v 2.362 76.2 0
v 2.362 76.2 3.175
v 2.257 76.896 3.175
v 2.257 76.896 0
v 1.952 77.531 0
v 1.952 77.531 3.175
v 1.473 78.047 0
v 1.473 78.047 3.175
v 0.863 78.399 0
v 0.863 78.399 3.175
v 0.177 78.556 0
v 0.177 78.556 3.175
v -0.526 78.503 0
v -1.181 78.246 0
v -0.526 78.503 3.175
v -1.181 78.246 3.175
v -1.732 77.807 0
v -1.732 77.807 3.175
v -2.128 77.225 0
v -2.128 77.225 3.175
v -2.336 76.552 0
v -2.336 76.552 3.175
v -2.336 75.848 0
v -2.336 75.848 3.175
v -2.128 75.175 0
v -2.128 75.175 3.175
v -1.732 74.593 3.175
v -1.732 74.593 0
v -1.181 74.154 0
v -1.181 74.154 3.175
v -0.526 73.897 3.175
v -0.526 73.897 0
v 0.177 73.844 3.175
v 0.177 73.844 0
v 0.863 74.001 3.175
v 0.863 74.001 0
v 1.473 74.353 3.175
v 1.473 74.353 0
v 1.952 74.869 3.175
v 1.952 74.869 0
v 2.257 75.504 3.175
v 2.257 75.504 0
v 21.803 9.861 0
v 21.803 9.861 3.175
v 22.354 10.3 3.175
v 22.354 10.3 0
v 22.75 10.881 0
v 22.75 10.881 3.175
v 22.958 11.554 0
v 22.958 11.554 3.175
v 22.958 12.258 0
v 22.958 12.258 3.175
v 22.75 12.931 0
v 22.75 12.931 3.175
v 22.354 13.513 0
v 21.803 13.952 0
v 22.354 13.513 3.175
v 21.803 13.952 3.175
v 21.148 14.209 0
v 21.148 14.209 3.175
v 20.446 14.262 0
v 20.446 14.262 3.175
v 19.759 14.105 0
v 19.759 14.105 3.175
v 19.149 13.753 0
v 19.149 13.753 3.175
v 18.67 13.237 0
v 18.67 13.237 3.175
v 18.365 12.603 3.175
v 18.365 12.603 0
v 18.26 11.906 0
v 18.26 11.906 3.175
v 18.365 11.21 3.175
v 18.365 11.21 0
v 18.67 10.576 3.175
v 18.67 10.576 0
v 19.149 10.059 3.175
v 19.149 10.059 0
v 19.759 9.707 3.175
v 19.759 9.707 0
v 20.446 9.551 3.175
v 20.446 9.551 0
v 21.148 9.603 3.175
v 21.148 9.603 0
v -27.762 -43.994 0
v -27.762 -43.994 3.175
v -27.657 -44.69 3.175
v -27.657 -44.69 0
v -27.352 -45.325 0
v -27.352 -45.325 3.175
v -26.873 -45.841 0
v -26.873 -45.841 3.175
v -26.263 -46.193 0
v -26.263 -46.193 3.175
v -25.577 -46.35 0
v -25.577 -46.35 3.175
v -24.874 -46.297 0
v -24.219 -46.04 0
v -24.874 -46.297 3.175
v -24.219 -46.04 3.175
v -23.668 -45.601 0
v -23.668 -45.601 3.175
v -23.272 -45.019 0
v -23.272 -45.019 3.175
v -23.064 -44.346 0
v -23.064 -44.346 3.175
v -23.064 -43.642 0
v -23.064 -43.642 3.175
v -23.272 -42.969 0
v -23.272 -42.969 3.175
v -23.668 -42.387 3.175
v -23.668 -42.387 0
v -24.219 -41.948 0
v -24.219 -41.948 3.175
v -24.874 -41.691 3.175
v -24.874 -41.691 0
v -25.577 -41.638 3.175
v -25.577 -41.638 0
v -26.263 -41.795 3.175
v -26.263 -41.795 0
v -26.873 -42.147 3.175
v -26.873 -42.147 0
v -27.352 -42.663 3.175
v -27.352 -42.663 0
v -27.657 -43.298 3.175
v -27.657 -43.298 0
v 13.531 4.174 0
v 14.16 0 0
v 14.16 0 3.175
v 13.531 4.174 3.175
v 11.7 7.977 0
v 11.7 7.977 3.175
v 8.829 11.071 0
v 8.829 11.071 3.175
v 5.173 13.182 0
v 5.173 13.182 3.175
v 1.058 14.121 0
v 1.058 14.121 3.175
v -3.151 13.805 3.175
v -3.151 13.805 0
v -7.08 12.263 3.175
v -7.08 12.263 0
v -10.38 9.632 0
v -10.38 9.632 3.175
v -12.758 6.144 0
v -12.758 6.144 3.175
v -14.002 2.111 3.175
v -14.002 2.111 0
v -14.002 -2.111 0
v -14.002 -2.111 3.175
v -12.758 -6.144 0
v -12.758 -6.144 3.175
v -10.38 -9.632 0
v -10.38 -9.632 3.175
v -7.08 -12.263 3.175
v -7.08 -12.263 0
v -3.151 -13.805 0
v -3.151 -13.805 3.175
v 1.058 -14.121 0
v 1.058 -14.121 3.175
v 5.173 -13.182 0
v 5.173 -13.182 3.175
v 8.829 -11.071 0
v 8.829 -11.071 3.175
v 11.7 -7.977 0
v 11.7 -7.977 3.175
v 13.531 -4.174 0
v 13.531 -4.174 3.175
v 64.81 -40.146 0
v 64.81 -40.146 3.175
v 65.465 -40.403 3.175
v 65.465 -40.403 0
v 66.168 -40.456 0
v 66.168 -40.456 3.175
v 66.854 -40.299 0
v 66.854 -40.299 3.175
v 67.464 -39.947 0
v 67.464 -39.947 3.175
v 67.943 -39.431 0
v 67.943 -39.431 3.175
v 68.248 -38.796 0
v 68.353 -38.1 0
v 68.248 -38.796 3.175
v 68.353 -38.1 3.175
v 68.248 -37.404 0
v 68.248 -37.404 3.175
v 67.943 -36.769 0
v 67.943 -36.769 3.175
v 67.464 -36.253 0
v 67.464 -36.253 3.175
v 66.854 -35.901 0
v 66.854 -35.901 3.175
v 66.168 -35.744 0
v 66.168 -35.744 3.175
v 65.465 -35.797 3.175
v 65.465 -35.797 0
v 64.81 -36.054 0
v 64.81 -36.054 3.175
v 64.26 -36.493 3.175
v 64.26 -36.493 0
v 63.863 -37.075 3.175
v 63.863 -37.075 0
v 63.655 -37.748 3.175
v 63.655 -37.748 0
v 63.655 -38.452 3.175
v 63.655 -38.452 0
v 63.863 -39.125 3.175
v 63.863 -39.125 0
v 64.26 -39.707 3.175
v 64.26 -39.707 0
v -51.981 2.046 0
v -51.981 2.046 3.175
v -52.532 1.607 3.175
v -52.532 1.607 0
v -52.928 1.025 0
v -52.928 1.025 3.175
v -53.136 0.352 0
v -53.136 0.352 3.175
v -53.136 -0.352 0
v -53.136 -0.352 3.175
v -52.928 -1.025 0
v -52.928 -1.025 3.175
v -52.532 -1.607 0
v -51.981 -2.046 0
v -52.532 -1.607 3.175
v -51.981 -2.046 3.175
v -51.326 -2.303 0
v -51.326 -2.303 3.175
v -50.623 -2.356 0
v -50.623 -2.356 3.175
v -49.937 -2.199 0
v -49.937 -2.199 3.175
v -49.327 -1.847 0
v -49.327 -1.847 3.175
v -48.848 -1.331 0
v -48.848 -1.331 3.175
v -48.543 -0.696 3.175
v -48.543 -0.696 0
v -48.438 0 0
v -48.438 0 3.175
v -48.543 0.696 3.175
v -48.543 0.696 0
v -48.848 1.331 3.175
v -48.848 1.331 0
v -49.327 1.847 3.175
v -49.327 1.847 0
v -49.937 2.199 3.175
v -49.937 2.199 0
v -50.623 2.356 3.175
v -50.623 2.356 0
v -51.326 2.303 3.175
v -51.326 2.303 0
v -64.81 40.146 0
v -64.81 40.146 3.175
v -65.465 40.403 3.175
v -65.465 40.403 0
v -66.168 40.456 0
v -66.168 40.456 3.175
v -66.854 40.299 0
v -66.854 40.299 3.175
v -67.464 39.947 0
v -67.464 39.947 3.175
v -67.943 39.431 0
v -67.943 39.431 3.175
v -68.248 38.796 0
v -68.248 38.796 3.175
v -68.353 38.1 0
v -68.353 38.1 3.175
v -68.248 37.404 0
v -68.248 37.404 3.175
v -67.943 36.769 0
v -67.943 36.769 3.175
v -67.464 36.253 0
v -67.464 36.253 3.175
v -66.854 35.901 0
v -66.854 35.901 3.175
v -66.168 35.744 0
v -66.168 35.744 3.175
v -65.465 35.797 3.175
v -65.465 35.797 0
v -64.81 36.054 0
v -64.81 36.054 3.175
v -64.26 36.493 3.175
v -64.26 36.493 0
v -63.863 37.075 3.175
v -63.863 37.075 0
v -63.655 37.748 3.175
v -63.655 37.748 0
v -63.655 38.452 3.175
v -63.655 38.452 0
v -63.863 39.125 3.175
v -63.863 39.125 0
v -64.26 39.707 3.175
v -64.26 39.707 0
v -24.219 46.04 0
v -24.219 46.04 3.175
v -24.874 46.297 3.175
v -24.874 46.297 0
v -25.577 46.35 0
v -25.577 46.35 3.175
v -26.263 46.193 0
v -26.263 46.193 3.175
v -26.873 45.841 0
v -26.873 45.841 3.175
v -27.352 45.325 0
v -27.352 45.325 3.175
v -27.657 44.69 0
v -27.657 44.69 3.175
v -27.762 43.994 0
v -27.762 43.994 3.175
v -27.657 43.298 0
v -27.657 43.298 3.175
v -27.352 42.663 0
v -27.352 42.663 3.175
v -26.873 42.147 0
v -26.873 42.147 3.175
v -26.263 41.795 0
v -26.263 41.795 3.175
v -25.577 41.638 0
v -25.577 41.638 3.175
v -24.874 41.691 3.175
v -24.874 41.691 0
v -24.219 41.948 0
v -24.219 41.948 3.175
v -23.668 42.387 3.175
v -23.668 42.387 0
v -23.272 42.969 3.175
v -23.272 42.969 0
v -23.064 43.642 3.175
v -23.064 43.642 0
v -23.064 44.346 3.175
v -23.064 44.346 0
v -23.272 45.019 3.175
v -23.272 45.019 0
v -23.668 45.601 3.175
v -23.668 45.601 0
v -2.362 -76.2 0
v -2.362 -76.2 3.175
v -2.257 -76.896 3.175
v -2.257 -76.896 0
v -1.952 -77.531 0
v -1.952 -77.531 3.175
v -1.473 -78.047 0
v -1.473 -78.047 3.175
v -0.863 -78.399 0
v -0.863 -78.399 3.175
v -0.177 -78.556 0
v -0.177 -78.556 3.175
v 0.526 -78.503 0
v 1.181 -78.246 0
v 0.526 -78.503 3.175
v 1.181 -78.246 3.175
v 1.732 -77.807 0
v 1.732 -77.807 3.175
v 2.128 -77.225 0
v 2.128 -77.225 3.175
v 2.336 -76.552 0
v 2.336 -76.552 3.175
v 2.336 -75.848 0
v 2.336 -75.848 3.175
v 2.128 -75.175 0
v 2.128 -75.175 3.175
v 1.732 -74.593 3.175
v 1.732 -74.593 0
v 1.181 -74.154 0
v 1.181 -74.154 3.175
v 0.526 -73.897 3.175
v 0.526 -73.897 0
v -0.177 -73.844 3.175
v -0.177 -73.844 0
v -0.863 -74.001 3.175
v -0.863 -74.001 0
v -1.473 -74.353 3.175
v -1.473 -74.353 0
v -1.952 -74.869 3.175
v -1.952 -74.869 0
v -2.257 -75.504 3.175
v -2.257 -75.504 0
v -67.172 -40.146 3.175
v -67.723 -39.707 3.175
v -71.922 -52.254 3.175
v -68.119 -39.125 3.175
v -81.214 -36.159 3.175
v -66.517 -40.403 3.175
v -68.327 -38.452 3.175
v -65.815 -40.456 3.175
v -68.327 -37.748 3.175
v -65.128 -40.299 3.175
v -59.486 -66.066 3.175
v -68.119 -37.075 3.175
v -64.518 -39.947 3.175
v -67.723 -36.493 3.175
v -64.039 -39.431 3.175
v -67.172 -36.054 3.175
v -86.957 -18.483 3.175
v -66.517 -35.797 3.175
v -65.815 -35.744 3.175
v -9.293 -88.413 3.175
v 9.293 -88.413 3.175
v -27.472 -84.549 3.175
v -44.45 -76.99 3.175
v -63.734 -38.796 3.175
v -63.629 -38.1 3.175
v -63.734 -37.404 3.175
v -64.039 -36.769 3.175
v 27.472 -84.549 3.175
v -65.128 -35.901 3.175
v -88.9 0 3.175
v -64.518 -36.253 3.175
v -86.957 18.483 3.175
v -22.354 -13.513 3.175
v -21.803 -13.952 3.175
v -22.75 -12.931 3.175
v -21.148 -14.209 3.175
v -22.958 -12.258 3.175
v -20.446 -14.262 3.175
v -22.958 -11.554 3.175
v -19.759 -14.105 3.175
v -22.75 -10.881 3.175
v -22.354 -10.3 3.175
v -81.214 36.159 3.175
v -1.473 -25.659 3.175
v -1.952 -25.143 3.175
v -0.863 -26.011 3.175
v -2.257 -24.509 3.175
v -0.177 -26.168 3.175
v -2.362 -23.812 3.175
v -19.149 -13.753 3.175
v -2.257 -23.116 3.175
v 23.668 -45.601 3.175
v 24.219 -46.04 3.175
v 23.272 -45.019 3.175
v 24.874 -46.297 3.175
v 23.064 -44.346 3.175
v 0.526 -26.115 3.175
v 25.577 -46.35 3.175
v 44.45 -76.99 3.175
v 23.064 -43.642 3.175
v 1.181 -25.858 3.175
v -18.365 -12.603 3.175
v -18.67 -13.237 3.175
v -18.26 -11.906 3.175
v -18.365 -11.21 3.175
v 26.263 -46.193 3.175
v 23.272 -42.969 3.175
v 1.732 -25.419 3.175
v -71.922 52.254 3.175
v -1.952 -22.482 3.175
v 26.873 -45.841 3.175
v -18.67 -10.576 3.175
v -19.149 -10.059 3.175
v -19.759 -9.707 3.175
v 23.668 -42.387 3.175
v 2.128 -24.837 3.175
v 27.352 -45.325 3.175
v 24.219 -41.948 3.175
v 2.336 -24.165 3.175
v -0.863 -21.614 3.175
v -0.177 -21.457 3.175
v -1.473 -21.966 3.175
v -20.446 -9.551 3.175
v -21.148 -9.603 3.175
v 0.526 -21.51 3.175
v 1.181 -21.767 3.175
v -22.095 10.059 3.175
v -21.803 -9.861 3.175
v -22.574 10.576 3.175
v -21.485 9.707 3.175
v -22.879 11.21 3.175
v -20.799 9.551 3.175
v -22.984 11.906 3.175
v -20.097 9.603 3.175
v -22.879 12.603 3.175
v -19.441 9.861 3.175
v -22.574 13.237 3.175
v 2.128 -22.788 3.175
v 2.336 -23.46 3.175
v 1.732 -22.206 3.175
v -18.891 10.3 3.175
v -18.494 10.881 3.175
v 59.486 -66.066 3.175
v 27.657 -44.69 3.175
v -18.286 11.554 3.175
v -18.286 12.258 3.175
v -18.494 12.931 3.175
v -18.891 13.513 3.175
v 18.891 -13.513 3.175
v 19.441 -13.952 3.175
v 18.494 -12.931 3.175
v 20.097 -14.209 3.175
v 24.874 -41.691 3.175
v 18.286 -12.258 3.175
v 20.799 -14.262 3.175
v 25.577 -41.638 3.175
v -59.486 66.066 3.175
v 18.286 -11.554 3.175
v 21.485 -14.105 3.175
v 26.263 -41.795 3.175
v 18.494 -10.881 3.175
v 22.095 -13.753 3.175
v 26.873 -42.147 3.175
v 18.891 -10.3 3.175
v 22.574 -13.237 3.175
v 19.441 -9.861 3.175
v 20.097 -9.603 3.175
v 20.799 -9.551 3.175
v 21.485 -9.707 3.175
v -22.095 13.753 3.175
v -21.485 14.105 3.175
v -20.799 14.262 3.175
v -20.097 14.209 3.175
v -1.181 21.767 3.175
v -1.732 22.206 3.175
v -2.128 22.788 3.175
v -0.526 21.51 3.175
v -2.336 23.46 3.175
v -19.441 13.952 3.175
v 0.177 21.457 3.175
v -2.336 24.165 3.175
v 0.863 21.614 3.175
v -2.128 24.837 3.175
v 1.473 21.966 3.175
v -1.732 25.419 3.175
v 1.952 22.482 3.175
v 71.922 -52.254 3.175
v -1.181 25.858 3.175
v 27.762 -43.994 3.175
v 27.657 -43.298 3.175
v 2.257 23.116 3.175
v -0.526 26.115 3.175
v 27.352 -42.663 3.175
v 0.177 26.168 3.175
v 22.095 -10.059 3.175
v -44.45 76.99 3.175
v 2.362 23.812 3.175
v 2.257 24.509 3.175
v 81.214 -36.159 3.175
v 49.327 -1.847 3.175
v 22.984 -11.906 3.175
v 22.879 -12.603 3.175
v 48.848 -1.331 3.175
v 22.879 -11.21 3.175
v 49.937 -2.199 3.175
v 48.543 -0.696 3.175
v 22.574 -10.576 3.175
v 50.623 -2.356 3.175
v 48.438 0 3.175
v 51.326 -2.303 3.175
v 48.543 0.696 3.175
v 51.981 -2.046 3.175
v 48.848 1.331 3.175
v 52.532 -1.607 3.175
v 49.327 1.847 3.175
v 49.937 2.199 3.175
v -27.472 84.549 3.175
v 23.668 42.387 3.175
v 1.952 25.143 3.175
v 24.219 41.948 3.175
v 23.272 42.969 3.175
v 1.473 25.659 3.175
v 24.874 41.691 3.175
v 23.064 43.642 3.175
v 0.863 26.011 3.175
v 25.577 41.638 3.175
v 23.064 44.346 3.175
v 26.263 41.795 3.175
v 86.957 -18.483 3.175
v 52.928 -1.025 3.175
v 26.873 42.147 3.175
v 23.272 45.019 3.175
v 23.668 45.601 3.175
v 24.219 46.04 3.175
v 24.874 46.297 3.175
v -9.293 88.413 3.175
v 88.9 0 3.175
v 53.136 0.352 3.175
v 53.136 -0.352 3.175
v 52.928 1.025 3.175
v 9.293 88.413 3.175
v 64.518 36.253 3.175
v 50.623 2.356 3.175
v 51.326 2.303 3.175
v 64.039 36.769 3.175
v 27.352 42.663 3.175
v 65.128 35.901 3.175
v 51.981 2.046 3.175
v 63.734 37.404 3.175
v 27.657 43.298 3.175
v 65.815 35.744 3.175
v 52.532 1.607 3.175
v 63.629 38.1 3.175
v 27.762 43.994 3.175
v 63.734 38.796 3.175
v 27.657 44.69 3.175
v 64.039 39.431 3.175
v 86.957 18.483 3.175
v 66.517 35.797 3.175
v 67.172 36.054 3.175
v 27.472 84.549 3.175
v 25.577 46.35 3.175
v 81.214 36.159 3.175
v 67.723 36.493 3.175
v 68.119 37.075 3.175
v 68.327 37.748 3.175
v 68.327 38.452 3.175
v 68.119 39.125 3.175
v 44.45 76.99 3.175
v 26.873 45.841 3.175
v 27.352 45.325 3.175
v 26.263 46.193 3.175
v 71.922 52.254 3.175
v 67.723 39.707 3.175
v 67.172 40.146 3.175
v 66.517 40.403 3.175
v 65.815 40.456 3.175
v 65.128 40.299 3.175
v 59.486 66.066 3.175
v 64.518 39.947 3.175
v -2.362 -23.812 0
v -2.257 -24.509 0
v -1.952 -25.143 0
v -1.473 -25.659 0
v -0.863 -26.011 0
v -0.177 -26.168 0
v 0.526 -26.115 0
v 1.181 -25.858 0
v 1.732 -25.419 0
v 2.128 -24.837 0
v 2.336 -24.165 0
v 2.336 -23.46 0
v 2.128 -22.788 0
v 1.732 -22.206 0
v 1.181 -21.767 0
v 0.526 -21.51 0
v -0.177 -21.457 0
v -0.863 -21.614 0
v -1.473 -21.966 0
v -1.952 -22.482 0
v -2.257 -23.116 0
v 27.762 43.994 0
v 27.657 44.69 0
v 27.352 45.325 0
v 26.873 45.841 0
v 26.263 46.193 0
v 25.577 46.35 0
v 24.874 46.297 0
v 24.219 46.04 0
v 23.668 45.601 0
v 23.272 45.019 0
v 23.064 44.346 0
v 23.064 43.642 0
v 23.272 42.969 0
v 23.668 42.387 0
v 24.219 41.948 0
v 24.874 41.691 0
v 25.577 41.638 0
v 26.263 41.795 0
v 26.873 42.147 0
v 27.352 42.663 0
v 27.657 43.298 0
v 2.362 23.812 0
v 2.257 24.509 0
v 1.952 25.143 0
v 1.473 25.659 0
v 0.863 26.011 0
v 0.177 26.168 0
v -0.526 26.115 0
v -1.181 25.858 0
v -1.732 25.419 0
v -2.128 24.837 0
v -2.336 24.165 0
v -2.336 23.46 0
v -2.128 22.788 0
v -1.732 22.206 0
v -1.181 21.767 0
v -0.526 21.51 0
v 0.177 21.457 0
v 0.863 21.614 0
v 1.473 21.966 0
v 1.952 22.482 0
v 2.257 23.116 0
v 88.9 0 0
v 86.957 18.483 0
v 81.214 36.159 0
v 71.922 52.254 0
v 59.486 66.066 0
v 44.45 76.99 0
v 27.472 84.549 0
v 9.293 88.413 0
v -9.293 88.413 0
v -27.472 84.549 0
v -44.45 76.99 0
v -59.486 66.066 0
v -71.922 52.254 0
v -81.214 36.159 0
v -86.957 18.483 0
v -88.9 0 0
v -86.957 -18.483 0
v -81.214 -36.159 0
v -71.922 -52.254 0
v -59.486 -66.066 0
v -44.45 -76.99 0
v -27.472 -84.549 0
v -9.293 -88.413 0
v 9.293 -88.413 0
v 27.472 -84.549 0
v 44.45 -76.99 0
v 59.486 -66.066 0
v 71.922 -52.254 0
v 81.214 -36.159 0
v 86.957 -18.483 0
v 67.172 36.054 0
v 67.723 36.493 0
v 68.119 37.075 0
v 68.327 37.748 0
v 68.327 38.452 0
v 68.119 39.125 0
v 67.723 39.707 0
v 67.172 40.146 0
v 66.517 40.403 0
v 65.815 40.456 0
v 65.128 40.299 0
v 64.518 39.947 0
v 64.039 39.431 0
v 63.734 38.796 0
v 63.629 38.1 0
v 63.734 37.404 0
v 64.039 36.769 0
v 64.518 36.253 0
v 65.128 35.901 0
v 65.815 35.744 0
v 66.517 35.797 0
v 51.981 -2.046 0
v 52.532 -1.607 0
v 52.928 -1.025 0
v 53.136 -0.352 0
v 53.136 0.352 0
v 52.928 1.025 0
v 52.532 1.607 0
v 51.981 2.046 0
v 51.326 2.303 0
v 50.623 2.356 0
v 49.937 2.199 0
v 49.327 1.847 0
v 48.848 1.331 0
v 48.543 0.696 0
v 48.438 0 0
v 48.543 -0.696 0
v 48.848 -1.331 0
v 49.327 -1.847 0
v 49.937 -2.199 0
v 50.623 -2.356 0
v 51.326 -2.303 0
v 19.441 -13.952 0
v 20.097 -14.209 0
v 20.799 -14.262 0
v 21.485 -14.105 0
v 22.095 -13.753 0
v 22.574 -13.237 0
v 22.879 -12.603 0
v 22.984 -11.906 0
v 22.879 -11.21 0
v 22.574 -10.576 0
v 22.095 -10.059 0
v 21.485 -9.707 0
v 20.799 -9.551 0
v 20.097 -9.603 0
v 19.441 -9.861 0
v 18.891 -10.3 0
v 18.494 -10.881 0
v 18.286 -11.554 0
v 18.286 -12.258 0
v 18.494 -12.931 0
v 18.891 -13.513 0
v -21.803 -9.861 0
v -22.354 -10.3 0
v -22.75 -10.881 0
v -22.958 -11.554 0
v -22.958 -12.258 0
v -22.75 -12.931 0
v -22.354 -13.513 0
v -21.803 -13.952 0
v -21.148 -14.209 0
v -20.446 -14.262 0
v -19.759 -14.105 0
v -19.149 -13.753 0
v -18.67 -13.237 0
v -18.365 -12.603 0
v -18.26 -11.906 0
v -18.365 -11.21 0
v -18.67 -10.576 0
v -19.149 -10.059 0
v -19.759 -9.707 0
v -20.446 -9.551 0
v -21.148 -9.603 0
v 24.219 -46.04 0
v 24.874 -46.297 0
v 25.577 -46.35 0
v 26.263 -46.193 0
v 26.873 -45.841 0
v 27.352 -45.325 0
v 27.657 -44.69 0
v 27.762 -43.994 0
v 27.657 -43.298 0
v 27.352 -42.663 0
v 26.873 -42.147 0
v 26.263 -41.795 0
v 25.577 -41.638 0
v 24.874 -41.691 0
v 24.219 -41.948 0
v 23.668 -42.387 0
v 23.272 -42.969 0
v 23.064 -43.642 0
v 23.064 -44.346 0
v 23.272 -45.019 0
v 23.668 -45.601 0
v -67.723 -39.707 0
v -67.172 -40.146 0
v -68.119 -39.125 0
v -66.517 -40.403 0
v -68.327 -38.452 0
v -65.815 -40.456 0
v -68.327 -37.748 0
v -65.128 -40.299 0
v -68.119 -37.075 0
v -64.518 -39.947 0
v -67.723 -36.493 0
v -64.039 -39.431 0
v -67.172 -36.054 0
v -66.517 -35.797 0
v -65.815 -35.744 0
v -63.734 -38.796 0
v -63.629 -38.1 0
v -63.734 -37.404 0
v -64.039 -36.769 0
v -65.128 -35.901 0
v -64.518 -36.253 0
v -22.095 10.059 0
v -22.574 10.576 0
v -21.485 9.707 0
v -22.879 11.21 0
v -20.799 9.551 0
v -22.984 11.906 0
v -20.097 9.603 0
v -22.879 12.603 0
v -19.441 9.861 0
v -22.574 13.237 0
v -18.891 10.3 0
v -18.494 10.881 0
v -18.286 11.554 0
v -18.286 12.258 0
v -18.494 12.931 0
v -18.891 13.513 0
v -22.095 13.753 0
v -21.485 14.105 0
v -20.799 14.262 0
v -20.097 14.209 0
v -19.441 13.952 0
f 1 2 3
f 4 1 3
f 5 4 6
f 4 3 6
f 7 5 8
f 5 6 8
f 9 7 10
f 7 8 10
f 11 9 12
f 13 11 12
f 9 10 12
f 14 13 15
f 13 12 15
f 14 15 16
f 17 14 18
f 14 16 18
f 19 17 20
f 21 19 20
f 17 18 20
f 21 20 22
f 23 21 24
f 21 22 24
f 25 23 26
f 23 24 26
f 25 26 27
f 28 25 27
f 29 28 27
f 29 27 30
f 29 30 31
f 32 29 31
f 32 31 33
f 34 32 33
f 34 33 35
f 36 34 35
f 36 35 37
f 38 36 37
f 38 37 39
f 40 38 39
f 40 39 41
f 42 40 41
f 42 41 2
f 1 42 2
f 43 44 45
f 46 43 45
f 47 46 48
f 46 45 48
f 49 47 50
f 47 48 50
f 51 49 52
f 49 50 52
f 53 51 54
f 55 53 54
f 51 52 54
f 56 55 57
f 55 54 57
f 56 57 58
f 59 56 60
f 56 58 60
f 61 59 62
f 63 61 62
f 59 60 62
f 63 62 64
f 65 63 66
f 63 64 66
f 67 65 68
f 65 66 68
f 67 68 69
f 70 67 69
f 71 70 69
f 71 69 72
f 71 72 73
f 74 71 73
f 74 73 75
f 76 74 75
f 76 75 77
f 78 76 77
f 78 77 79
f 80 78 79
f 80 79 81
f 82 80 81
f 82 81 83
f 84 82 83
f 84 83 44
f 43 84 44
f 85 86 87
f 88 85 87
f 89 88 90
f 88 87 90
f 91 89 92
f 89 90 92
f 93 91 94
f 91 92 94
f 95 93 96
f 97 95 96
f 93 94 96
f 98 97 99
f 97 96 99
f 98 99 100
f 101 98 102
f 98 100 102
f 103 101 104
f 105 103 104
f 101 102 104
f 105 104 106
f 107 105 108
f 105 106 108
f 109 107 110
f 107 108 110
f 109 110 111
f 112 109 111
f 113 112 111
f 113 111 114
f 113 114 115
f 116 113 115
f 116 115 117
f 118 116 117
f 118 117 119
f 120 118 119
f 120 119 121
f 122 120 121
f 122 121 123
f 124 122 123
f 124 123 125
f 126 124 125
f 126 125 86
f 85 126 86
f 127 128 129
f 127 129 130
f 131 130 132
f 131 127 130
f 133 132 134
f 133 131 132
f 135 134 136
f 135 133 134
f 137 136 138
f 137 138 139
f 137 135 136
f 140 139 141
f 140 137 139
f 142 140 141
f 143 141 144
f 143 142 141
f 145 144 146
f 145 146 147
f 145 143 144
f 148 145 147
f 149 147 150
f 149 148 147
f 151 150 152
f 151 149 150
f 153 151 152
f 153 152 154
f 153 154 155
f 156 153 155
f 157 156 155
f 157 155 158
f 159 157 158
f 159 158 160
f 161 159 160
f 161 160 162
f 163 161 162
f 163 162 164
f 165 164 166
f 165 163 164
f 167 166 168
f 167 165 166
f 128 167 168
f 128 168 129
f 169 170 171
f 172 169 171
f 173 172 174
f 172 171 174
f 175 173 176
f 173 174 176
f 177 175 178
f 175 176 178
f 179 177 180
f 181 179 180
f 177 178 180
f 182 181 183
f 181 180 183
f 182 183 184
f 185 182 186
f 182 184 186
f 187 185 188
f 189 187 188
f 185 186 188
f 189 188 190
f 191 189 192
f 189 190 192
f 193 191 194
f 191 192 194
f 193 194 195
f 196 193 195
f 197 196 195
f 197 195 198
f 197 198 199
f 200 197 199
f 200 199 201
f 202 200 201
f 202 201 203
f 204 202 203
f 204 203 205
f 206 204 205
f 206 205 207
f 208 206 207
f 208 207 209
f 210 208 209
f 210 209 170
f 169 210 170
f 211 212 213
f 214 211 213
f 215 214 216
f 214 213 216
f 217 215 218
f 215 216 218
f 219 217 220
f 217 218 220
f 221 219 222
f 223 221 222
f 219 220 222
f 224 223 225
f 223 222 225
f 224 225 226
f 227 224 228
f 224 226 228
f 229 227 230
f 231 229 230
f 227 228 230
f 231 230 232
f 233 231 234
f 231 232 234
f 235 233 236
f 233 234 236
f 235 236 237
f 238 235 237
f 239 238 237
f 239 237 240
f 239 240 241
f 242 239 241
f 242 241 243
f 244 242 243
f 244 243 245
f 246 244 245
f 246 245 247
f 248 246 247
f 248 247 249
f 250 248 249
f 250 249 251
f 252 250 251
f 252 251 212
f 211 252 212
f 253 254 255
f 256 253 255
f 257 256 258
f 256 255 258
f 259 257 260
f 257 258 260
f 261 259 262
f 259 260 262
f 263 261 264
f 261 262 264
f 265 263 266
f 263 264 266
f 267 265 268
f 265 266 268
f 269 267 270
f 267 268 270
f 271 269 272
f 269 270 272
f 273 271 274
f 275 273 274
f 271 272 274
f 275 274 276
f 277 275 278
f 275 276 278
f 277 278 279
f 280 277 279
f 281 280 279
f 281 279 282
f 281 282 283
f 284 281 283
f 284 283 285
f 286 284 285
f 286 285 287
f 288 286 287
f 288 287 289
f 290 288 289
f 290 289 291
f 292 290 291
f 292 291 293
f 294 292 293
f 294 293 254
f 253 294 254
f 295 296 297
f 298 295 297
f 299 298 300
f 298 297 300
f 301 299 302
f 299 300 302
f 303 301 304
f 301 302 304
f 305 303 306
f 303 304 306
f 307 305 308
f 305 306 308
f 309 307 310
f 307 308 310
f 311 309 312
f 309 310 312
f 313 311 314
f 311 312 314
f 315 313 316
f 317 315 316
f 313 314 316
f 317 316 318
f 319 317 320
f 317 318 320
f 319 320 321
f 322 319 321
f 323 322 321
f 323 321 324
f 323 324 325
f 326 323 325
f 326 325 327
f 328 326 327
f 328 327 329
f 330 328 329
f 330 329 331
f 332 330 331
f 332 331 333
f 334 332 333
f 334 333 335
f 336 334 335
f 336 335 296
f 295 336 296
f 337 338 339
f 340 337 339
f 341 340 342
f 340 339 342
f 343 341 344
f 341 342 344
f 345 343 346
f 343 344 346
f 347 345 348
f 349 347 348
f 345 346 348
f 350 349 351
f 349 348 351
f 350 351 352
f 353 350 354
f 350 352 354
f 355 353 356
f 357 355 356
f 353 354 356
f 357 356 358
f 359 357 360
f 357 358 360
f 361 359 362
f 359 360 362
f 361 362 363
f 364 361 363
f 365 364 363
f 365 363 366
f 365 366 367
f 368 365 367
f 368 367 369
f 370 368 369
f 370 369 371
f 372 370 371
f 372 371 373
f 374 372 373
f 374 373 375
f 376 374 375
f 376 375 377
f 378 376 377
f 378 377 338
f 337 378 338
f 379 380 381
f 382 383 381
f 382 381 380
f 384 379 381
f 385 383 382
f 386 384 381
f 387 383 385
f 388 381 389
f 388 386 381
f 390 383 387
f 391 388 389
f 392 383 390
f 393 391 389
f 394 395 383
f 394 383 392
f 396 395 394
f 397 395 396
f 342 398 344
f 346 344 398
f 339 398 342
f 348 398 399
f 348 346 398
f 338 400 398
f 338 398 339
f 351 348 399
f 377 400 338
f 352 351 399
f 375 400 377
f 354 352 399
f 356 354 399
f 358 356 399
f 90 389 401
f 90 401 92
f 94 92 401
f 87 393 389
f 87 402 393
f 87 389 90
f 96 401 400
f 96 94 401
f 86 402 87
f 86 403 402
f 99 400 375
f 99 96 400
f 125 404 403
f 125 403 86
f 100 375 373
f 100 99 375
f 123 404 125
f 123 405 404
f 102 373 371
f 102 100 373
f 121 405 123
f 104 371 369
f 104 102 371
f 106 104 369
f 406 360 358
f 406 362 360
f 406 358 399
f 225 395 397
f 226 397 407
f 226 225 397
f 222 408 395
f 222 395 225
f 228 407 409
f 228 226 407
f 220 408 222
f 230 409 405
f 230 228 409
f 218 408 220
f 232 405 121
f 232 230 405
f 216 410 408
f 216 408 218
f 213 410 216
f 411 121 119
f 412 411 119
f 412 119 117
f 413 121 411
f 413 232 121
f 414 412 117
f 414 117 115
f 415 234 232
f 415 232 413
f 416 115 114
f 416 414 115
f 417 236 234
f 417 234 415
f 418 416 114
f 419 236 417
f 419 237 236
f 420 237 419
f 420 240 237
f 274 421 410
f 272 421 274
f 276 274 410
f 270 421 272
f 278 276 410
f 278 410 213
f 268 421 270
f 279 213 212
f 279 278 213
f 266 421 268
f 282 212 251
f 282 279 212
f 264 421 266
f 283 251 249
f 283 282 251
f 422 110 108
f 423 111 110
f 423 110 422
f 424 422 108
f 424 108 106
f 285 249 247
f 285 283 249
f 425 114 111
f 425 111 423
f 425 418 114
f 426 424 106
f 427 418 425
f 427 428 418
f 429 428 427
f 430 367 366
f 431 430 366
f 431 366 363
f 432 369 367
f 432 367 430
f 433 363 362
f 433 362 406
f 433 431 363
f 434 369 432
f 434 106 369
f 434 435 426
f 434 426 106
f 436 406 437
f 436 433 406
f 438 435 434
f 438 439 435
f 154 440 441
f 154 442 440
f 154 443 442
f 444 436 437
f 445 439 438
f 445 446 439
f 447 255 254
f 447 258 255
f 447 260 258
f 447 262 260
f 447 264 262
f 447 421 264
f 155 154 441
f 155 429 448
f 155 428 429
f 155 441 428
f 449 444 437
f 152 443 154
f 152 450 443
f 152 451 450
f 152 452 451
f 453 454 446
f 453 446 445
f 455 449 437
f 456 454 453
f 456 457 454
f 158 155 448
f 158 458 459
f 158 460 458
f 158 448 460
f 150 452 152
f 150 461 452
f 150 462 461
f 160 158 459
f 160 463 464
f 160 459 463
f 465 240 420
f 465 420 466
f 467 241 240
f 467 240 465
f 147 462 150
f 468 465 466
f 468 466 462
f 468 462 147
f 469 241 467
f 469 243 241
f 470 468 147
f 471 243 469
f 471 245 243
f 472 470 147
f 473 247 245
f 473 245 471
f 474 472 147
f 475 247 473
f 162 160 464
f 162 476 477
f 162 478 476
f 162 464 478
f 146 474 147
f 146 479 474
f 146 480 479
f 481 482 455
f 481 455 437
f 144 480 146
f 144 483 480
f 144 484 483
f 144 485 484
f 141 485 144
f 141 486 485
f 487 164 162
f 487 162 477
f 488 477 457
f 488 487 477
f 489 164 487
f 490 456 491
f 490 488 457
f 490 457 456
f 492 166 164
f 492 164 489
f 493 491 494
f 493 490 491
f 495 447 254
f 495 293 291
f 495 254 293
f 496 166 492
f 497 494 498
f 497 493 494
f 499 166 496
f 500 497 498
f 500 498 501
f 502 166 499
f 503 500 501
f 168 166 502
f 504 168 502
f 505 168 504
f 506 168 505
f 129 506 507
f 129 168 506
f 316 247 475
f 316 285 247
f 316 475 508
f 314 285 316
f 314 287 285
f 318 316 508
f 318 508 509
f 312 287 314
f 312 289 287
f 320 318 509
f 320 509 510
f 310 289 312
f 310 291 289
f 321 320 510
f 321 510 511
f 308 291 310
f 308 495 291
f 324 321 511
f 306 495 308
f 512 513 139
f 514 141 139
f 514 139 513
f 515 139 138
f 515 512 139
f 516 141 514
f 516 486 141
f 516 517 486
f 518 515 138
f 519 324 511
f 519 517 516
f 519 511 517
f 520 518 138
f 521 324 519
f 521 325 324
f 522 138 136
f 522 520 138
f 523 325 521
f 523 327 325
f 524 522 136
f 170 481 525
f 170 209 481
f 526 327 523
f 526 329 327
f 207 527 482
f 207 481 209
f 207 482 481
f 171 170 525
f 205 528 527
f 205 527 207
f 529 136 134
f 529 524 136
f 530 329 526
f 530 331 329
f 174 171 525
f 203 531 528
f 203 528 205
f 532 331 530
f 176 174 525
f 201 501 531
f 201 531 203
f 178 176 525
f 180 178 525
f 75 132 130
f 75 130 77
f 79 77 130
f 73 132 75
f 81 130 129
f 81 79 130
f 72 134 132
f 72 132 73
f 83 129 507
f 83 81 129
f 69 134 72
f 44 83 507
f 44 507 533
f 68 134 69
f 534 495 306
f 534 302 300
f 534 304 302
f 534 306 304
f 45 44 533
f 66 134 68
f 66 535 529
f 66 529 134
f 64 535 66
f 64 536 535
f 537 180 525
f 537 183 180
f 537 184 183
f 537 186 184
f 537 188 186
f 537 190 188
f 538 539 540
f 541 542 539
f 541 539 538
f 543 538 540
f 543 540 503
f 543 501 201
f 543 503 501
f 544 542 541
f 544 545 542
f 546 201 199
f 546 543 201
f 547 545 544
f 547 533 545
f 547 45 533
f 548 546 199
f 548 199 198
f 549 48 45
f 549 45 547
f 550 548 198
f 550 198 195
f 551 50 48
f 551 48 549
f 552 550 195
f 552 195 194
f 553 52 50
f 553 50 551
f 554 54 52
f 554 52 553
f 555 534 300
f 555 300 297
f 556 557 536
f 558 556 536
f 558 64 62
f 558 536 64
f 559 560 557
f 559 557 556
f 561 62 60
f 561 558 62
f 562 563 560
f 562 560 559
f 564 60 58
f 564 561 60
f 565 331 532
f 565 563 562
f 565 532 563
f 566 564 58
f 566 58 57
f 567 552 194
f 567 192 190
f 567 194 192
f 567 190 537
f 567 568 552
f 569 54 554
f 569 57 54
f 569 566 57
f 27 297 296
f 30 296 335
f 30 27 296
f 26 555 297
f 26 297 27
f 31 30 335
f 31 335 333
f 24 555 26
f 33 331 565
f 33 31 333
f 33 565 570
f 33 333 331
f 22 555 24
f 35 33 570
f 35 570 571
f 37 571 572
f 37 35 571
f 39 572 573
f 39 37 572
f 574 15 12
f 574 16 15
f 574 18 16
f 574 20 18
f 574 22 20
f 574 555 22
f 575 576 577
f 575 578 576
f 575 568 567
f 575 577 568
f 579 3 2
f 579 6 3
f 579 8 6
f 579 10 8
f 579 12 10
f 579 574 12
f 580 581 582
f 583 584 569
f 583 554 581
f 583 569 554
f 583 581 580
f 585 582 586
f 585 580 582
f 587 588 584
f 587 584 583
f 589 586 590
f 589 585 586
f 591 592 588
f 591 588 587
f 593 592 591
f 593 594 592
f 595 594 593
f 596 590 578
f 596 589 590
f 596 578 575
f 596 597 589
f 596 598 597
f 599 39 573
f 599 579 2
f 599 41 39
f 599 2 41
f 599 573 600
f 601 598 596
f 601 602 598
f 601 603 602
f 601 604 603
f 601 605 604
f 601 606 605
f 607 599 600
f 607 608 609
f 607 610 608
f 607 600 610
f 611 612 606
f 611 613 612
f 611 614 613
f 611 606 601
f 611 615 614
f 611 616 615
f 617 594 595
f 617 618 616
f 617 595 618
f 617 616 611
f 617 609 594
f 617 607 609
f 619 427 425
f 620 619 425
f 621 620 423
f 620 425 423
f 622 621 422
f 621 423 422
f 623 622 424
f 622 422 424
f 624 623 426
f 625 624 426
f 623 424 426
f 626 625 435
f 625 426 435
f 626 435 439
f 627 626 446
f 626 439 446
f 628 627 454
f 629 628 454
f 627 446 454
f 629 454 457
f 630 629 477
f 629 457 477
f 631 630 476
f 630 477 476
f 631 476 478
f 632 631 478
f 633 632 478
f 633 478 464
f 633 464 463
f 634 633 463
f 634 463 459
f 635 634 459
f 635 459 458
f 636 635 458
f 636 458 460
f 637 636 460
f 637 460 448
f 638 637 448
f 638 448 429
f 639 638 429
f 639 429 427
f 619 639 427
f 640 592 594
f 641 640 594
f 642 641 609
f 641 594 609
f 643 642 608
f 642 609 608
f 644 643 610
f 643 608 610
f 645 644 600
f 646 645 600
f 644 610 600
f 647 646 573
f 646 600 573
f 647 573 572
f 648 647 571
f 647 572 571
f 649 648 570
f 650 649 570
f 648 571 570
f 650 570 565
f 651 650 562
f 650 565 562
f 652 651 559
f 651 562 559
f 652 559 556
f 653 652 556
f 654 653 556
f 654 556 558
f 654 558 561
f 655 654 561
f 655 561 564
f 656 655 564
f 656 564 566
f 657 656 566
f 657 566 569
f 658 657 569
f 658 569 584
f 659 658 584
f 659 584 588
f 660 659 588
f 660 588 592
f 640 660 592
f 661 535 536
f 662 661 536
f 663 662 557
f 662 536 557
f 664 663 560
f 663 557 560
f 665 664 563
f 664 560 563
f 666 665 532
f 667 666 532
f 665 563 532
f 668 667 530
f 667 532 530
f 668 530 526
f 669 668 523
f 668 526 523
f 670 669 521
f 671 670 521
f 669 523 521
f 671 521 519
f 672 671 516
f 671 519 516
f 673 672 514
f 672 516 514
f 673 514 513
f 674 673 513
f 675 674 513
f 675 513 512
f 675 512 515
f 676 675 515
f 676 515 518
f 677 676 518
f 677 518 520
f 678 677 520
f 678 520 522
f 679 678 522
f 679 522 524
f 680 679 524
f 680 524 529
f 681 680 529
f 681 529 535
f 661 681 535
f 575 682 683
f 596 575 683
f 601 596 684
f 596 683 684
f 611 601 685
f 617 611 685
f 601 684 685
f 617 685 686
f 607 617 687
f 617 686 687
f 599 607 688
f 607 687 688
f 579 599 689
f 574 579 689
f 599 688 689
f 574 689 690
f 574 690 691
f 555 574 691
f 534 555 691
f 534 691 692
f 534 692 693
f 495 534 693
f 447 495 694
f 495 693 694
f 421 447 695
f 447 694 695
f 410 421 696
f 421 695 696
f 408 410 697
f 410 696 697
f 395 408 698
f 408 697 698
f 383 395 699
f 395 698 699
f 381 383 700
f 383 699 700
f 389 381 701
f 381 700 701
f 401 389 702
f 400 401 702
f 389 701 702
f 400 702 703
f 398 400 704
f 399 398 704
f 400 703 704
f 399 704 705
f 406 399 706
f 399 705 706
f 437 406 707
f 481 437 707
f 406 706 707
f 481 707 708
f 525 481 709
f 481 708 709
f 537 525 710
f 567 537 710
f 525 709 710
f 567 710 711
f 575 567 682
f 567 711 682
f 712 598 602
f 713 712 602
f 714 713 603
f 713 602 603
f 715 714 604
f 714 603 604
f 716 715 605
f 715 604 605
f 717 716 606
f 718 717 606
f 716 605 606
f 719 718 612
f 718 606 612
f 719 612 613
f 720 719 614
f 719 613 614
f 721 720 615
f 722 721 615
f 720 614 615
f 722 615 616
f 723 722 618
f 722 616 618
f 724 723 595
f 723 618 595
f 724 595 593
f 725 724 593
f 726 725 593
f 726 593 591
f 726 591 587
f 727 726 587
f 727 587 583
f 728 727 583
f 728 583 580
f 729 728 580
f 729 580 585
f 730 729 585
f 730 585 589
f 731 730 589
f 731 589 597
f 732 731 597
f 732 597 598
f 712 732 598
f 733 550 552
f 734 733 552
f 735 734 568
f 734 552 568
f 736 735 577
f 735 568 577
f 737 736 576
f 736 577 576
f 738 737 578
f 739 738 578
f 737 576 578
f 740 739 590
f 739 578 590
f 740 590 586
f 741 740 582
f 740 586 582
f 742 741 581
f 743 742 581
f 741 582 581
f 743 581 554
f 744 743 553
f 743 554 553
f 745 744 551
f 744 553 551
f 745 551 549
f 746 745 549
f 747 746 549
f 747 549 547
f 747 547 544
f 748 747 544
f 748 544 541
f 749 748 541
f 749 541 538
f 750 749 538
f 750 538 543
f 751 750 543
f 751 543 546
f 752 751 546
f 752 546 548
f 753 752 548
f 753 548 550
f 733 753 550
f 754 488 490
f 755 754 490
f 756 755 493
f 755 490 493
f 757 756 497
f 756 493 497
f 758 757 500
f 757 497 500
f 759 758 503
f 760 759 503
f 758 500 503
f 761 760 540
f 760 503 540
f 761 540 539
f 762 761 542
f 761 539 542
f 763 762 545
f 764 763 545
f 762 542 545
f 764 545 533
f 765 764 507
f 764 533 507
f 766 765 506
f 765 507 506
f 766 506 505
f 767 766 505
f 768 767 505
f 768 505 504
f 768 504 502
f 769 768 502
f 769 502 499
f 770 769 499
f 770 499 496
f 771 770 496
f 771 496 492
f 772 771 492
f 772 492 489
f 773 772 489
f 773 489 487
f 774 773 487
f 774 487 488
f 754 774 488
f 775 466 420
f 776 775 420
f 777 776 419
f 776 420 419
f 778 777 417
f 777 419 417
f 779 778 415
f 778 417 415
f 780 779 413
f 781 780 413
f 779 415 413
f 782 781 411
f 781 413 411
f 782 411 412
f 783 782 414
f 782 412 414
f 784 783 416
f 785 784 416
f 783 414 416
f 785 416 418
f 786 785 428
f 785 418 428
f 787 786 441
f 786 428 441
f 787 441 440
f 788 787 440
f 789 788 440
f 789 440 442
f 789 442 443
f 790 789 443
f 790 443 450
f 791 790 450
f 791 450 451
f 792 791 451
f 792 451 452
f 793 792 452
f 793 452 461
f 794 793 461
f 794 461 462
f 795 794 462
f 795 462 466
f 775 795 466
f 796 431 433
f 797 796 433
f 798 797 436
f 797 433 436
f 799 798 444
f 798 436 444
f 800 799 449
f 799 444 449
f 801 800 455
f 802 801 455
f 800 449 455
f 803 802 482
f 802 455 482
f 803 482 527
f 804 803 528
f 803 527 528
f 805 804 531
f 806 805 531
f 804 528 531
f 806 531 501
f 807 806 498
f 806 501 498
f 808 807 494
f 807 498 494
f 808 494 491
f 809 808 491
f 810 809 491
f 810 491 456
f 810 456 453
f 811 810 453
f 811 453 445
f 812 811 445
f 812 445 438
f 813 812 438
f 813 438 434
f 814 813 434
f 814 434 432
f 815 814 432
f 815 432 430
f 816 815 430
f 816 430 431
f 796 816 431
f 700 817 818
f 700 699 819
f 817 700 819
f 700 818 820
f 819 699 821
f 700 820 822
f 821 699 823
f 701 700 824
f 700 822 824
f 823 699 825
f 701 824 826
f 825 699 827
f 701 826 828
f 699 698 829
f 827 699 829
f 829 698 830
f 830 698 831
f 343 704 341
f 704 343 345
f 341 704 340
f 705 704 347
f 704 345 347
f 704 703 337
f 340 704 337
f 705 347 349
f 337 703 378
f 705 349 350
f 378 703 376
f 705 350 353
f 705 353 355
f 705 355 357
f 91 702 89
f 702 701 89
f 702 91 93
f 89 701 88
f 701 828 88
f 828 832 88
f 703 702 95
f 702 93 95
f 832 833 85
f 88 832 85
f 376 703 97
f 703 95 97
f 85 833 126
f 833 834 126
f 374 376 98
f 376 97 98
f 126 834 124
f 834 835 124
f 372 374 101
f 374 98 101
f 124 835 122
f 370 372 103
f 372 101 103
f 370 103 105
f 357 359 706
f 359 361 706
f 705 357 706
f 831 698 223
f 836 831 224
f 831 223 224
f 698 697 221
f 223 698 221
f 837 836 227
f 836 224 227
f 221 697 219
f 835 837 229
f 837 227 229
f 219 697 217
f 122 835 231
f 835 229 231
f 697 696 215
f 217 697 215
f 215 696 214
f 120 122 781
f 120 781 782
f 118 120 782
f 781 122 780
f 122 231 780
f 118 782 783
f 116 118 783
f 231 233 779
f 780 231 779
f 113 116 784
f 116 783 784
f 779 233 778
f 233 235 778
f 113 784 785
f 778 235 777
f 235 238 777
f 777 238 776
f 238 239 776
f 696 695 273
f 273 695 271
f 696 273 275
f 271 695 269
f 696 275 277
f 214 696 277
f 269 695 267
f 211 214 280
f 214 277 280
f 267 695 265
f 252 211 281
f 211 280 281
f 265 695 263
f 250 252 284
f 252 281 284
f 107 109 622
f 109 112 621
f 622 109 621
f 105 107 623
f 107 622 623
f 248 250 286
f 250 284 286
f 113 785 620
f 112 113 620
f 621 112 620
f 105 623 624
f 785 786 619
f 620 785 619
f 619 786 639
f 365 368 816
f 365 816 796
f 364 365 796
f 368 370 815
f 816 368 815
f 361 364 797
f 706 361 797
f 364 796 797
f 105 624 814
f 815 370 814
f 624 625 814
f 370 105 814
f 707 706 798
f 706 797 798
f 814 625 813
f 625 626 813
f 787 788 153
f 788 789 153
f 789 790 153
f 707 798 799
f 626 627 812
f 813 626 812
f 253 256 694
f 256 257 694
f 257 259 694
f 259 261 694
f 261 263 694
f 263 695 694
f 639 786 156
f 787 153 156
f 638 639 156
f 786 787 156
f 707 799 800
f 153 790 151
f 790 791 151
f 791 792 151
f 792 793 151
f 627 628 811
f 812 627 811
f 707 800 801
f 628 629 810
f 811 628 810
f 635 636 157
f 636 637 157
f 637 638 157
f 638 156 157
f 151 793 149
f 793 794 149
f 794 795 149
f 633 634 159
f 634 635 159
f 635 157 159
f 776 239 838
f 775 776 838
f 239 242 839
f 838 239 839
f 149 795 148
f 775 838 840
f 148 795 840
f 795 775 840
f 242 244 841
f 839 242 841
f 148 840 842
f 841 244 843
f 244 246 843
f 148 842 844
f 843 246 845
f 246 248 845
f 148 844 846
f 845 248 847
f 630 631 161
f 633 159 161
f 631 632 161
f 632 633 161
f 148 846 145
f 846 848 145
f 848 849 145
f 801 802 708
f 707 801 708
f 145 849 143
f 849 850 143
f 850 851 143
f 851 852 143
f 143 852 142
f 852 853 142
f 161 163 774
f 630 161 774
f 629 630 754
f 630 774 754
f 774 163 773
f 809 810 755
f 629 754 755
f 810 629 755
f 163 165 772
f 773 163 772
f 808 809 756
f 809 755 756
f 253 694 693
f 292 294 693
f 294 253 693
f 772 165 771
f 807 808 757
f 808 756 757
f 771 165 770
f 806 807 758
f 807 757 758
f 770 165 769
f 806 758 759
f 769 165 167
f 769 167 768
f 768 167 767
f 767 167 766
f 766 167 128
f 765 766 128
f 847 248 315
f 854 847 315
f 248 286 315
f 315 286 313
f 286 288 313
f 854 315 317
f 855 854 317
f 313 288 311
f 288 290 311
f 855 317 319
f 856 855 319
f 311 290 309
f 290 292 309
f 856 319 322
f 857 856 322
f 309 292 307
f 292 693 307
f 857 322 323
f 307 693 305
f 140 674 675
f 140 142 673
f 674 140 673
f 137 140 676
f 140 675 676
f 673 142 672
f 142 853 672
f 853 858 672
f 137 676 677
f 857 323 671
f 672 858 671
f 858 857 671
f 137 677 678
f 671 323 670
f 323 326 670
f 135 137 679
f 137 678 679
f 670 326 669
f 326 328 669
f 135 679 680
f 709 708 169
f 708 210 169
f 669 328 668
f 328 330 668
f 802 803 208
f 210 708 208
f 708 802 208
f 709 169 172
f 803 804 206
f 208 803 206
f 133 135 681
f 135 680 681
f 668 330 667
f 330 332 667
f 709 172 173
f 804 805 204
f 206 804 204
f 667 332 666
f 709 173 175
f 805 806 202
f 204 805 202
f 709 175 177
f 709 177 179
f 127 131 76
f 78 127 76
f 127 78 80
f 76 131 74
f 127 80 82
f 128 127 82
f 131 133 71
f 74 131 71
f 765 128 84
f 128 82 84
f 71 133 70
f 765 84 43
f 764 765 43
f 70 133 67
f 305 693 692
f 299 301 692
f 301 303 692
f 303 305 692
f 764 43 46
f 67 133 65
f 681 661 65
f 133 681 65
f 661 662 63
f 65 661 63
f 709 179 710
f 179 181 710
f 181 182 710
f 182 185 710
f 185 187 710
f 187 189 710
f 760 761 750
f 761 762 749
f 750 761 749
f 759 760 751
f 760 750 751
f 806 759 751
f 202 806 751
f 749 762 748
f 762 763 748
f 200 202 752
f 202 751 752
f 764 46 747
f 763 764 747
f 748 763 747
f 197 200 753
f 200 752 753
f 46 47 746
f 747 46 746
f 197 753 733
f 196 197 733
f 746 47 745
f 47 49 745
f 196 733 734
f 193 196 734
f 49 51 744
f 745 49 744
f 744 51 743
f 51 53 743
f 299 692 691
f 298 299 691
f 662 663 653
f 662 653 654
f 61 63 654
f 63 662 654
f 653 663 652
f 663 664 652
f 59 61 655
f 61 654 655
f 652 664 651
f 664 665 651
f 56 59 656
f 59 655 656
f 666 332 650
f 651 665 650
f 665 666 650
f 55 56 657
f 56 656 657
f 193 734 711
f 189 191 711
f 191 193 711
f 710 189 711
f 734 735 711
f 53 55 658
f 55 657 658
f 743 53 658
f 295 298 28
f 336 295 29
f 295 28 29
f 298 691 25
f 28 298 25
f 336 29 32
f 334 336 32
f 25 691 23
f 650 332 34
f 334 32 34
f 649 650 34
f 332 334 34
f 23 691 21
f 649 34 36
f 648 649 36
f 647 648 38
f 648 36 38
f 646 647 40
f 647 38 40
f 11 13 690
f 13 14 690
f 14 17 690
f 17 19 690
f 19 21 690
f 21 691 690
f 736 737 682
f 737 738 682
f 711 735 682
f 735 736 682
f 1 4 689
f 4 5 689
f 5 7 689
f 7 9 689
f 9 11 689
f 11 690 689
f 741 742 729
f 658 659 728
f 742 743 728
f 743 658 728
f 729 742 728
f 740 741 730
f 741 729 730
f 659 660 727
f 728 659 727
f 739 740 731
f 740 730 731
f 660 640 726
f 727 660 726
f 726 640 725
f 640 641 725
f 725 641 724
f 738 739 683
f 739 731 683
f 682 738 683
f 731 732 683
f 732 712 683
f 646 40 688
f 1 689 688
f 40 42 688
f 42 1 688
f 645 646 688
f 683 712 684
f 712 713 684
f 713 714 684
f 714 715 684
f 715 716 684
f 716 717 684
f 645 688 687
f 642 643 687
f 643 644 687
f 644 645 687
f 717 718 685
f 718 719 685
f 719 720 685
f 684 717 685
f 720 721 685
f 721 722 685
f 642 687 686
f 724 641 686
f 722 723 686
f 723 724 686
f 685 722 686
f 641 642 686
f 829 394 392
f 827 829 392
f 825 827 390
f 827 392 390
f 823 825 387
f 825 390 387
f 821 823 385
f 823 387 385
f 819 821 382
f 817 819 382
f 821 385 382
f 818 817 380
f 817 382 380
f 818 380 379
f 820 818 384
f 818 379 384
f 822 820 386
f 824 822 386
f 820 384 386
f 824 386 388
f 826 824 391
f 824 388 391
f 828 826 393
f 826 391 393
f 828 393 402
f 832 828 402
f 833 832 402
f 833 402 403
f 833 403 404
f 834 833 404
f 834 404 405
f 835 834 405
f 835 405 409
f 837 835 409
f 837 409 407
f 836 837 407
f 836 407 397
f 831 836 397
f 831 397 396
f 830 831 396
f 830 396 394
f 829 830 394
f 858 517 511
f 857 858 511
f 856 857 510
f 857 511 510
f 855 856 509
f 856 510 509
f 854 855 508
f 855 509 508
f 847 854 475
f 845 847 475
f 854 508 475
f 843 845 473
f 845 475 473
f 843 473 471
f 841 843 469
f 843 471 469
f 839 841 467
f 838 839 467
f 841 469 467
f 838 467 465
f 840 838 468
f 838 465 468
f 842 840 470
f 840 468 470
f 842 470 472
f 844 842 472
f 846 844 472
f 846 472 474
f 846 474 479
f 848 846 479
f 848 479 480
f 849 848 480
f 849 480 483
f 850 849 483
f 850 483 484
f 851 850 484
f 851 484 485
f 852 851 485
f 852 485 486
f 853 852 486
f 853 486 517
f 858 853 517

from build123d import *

# Parameters (mm, degrees)
F0_R            = 88.9
F0_R_2          = 14.1605
F1_DEPTH        = 3.175
F2_R            = 2.3622
F3_DEPTH        = 3.176
F3_COPIES_COUNT = 6


# Not quite as in the source:
# - a pattern or mirror of a feature is missing from the dataset's text; its kind, count and spacing are read off the source's solid


with BuildPart() as f1:
    # F0 (on Top) → F1 (new body)
    with BuildSketch(Plane.XY):
        Circle(F0_R)
        Circle(F0_R_2, mode=Mode.SUBTRACT)
    extrude(amount=F1_DEPTH)

    # F2 (on face) → F3 (cut, through all)
    with BuildSketch(Plane.XY.offset(3.175)):
        with Locations((0, 23.8125)):
            Circle(F2_R)
        with Locations((0, 76.2)):
            Circle(F2_R)
        with Locations((25.4, 43.9940905122)):
            Circle(F2_R)
    f3 = extrude(amount=-F3_DEPTH, mode=Mode.SUBTRACT)

    # F3_copies: F3 ×6 about axis
    f3_copies_axis = Axis((0, 0, 0), (0, 0, 1))
    for i in range(1, F3_COPIES_COUNT):
        add(f3.rotate(f3_copies_axis, i * 360 / F3_COPIES_COUNT), mode=Mode.SUBTRACT)


solid = f1.part
